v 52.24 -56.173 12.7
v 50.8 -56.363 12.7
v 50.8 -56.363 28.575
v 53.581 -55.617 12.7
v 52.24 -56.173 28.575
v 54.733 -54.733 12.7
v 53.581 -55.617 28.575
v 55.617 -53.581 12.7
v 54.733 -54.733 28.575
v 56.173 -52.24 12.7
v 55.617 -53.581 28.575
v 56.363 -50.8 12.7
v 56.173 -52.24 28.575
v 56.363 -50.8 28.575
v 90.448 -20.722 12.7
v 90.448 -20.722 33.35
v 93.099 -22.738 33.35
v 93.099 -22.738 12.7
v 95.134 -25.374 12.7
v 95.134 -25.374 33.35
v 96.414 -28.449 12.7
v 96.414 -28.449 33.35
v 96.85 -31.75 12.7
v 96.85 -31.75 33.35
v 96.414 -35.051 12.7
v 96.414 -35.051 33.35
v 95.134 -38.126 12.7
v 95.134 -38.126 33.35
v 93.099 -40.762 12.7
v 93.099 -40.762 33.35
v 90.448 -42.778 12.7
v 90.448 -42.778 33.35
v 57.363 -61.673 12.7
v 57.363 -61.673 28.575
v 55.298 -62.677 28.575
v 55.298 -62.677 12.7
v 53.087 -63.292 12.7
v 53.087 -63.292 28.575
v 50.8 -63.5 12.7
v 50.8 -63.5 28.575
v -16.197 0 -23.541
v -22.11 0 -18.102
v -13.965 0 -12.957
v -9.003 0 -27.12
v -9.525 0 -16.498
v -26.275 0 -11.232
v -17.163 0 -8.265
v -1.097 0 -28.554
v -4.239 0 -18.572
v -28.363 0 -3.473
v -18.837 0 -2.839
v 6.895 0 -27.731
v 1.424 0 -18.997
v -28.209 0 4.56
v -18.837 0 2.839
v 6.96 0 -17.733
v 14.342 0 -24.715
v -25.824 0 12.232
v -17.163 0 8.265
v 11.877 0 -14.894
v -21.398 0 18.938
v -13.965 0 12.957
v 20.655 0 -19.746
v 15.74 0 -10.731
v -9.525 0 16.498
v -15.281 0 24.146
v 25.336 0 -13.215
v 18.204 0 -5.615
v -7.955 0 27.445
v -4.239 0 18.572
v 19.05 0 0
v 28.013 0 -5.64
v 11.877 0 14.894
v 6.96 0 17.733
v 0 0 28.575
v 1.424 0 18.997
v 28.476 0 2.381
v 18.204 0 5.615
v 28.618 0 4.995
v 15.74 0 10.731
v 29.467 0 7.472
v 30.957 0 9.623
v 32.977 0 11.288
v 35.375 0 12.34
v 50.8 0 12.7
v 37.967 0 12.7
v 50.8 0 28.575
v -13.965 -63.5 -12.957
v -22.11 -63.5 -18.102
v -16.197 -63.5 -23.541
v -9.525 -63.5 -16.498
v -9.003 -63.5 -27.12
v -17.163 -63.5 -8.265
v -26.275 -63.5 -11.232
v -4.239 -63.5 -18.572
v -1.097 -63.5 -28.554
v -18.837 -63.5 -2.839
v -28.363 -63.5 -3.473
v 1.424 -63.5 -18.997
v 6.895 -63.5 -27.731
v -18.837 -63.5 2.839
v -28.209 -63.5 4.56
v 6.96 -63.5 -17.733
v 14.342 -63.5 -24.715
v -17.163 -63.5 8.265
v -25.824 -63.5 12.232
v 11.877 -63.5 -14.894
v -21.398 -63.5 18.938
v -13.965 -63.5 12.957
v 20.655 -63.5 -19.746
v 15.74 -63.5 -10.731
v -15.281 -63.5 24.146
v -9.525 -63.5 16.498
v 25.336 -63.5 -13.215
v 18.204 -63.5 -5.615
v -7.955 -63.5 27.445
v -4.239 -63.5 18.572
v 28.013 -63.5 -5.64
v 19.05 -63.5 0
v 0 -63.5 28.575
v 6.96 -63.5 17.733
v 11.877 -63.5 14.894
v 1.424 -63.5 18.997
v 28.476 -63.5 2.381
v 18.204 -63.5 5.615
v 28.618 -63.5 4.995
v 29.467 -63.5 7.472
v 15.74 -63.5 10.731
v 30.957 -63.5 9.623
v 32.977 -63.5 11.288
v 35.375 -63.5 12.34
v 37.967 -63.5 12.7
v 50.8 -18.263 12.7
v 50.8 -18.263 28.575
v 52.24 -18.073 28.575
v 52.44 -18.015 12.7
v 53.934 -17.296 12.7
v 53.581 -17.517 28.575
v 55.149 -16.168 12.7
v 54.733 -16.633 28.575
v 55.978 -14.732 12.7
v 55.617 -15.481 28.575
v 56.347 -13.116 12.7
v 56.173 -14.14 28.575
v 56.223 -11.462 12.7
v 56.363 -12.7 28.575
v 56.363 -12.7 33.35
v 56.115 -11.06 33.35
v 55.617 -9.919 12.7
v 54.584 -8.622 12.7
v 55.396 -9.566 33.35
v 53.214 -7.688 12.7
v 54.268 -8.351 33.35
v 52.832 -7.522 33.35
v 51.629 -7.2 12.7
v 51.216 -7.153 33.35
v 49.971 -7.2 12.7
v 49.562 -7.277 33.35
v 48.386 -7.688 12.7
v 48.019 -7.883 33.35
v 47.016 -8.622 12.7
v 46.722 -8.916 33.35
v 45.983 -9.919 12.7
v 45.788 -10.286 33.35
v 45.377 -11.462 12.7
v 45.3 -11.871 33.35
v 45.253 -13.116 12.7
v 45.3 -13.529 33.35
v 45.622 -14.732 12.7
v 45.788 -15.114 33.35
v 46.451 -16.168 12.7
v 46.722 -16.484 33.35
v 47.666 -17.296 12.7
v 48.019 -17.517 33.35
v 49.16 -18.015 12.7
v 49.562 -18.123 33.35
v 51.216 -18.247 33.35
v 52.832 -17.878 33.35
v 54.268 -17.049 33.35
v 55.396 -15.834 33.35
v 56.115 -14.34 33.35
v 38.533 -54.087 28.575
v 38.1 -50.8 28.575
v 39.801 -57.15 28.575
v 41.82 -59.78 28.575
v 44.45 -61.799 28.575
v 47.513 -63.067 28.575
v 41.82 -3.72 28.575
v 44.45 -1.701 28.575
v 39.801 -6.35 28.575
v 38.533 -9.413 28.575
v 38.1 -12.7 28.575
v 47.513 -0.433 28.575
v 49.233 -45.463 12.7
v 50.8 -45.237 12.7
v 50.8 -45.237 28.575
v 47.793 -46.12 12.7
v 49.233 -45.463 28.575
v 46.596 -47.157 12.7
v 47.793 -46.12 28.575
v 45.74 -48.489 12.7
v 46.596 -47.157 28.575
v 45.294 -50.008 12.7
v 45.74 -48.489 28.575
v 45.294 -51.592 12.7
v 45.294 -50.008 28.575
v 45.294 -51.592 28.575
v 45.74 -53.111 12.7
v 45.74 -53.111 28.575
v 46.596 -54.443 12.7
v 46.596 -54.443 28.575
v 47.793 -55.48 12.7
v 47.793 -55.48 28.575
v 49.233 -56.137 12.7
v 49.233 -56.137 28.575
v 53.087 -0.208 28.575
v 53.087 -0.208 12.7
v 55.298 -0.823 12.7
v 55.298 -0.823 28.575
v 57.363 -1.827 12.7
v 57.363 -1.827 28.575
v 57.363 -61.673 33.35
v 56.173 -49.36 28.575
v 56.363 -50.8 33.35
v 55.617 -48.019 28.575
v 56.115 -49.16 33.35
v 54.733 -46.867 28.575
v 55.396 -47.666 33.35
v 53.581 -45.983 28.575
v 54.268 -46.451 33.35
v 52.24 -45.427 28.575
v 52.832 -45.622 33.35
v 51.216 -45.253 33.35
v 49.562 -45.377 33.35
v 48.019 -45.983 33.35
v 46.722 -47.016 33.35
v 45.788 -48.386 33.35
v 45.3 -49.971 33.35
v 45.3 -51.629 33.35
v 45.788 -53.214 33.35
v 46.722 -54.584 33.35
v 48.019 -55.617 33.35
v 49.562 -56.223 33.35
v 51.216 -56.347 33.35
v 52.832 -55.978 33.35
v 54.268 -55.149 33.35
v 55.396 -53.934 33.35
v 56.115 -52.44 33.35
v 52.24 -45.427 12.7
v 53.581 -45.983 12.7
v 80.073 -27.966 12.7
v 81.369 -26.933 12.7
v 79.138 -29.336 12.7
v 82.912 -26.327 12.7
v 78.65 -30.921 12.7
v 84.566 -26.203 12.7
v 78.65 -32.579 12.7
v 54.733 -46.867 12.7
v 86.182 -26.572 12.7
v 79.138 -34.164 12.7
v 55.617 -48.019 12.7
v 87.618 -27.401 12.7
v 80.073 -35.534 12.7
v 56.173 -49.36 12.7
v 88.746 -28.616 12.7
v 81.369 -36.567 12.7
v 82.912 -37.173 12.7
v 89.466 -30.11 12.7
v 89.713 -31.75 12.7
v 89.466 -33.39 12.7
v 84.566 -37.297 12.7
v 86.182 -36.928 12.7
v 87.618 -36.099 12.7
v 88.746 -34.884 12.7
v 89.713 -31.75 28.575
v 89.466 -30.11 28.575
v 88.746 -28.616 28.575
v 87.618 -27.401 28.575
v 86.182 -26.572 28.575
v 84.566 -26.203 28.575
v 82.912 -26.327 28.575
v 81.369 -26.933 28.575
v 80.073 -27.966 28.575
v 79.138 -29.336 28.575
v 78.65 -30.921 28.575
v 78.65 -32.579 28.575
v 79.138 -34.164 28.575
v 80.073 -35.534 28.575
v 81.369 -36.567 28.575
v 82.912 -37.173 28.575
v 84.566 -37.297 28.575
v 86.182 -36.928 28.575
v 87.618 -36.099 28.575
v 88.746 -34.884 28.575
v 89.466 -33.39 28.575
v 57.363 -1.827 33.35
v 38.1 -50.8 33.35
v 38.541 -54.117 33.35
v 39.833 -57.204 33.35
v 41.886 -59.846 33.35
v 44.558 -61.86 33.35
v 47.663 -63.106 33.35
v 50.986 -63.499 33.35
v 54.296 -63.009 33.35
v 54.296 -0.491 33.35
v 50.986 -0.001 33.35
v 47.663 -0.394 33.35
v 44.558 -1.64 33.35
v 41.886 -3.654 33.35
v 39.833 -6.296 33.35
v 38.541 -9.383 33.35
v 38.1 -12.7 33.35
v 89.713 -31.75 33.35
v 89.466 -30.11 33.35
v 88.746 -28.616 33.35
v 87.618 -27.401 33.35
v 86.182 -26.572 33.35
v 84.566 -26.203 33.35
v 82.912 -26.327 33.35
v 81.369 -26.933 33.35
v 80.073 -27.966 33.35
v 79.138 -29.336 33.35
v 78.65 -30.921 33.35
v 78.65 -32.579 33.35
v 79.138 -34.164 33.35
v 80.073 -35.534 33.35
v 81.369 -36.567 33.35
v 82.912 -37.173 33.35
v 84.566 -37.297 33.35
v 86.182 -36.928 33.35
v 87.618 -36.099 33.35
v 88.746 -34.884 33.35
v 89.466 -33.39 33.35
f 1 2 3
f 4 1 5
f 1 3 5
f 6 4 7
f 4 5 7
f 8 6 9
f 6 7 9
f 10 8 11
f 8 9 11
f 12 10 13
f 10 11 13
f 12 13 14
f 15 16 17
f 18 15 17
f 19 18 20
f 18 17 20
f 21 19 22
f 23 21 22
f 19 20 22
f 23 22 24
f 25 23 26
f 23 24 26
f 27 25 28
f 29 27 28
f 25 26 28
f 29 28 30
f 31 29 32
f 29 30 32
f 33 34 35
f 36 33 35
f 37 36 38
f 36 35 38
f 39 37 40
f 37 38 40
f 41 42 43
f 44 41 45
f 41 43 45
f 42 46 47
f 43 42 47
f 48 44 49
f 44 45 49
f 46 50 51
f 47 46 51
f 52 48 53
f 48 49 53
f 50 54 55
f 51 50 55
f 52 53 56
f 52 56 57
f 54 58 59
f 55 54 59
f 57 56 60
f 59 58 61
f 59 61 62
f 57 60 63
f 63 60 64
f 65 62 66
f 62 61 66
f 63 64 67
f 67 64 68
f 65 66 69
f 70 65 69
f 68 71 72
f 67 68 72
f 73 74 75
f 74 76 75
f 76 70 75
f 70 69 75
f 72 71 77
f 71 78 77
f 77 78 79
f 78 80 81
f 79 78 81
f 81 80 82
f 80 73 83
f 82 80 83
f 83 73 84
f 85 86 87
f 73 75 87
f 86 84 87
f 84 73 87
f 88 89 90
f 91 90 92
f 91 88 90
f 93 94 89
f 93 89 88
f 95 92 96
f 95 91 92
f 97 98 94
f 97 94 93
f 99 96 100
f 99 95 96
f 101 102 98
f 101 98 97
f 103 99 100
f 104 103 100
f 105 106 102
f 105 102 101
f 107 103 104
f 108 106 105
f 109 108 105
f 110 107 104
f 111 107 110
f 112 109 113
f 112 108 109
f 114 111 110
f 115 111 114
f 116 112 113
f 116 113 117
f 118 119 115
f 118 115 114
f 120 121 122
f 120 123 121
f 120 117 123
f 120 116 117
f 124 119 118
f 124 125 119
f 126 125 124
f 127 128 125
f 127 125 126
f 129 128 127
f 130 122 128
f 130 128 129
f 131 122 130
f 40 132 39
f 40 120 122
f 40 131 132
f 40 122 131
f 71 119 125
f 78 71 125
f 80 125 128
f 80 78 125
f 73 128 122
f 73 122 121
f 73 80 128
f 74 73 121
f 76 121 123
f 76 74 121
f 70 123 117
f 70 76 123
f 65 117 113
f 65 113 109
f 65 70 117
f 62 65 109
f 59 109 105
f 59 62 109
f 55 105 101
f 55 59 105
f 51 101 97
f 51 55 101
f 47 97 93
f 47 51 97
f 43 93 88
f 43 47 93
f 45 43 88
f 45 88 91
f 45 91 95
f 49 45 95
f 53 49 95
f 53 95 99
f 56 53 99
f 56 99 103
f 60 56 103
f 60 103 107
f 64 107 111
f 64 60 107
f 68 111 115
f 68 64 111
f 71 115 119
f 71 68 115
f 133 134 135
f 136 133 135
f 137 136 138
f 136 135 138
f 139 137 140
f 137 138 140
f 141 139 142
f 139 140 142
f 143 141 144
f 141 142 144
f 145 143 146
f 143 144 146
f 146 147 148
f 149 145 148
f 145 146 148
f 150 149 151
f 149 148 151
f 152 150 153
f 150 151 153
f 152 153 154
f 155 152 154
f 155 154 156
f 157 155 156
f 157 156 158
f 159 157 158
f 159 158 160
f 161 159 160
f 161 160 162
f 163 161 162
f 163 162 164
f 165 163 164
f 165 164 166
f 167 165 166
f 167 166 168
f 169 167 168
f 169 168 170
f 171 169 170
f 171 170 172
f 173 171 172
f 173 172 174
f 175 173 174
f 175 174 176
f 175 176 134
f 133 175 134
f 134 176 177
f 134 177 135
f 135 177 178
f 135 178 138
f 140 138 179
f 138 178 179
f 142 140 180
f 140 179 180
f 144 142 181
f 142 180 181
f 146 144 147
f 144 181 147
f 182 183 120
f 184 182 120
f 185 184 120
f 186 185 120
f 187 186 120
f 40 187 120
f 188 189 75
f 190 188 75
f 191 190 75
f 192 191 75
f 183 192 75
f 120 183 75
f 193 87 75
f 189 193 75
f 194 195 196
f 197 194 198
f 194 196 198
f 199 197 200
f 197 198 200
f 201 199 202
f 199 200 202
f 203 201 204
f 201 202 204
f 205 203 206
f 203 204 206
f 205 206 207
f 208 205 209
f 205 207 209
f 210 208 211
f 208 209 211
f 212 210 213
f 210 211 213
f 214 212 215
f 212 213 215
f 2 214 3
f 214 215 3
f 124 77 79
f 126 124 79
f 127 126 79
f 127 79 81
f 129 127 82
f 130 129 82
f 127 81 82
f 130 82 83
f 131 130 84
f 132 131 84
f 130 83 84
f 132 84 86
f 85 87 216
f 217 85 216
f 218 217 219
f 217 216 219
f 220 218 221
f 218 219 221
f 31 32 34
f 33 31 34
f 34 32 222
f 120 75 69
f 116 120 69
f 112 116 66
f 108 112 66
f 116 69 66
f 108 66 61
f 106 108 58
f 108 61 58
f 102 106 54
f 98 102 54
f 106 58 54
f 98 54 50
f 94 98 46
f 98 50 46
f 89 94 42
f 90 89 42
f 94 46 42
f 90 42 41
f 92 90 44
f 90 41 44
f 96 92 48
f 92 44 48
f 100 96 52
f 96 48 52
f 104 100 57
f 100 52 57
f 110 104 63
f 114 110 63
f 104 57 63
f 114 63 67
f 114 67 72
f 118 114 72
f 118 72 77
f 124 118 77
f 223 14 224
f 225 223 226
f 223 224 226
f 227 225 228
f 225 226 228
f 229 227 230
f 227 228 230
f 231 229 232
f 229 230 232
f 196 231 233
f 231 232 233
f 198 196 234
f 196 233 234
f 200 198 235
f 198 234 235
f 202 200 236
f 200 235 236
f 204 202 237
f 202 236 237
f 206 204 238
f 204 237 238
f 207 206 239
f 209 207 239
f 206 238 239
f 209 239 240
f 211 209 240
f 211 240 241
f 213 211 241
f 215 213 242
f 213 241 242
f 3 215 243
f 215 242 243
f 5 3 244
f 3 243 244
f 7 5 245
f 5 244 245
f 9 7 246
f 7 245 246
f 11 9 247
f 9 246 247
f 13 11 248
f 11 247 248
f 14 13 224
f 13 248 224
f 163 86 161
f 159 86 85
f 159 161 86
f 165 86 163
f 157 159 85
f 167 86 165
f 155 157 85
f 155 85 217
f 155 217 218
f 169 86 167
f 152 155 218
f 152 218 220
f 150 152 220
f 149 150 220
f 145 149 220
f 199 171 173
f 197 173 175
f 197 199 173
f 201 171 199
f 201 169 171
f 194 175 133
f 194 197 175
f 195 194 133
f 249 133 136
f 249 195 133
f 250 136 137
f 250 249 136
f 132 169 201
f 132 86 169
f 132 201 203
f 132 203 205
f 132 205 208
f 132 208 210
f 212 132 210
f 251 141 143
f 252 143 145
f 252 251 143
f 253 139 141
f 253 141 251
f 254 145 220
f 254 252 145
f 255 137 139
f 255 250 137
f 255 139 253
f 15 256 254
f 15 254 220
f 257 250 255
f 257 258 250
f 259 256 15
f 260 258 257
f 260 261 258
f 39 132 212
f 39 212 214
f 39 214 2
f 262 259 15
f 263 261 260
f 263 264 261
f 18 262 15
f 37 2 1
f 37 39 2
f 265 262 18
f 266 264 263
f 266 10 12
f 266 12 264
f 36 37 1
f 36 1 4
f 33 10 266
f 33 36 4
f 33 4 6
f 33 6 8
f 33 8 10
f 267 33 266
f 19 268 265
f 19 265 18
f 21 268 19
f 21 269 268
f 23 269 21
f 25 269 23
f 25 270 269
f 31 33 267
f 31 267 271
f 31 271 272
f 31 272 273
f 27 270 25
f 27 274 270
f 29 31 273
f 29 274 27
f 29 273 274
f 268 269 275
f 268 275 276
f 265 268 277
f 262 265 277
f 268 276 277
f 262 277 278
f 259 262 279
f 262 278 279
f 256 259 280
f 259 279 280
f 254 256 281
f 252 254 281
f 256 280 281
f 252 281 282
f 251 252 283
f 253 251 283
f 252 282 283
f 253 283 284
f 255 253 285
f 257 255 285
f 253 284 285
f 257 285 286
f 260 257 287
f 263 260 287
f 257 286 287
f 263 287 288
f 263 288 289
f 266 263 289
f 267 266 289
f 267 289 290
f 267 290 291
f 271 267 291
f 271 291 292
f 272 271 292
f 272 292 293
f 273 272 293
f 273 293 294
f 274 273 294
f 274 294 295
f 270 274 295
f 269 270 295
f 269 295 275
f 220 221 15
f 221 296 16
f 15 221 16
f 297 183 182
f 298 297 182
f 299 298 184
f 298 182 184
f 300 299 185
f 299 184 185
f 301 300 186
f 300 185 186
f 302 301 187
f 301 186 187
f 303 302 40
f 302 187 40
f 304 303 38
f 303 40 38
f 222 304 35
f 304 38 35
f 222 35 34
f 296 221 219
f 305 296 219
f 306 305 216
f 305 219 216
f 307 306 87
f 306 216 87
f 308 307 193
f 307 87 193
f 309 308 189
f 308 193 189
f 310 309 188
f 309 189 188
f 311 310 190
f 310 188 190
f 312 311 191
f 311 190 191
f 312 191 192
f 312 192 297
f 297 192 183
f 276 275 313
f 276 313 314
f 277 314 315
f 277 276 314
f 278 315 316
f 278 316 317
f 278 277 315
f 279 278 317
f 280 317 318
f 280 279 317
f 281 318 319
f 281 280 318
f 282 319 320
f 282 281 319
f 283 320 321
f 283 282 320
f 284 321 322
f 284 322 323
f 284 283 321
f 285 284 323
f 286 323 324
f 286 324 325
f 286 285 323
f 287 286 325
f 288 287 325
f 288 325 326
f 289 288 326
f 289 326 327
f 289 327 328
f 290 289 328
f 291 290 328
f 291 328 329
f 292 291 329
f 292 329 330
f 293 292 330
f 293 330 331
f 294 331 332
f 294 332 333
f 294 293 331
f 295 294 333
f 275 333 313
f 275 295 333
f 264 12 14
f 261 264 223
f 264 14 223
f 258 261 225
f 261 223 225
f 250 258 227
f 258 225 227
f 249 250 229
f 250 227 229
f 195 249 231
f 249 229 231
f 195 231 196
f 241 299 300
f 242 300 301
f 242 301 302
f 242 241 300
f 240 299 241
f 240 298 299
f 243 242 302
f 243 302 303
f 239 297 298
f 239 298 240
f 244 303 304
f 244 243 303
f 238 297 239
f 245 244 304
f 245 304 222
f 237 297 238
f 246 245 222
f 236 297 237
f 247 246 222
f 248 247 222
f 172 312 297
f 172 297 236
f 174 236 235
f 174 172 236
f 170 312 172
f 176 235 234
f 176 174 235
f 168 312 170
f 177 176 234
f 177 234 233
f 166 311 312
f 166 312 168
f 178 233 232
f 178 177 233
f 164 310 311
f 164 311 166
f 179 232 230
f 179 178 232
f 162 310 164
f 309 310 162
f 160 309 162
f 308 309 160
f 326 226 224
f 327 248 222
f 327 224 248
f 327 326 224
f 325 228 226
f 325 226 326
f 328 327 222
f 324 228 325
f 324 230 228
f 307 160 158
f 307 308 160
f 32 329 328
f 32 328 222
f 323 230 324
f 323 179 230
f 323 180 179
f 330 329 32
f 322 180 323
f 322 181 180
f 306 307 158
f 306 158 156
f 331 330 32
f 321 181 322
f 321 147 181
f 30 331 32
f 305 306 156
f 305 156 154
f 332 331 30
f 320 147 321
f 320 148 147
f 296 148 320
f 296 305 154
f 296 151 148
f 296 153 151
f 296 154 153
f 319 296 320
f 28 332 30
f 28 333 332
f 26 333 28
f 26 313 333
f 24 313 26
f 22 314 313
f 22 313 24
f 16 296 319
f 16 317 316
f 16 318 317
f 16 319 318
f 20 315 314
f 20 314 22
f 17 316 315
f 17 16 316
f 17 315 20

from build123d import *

# Parameters (mm, degrees)
F0_R     = 19.05
F1_DEPTH = 63.5
F2_R     = 5.5626
F3_DEPTH = 4.7752
F6_DEPTH = 15.875
F7_R     = 5.5626
F8_DEPTH = 57.151


with BuildPart() as f1:
    # F0 (on Front) → F1 (new body)
    with BuildSketch(Plane.XZ):
        with BuildLine():
            Line((37.967478, 12.7), (50.8, 12.7))
            Line((50.8, 12.7), (50.8, 28.575))
            Line((50.8, 28.575), (0, 28.575))
            ThreePointArc((0, 28.575), (-19.345366, -21.030631), (28.475608, 2.38125))
            ThreePointArc((28.475608, 2.38125), (30.957268, 9.623455), (37.967478, 12.7))
        make_face()
        Circle(F0_R, mode=Mode.SUBTRACT)
    extrude(amount=F1_DEPTH)

    # F2 (on face) → F3 (join)
    with BuildSketch(Plane.XY.offset(28.575)):
        with BuildLine():
            ThreePointArc((57.36329, -1.827409), (44.557556, -1.640077), (38.1, -12.7))
            Line((38.1, -12.7), (38.1, -50.8))
            ThreePointArc((38.1, -50.8), (44.557556, -61.859923), (57.36329, -61.672591))
            Line((57.36329, -61.672591), (90.448286, -42.778332))
            ThreePointArc((90.448286, -42.778332), (96.8502, -31.75), (90.448286, -20.721668))
            Line((90.448286, -20.721668), (57.36329, -1.827409))
        make_face()
        with Locations((50.8, -50.8)):
            Circle(F2_R, mode=Mode.SUBTRACT)
        with Locations((50.8, -12.7)):
            Circle(F2_R, mode=Mode.SUBTRACT)
        with Locations((84.1502, -31.75)):
            Circle(F2_R, mode=Mode.SUBTRACT)
    extrude(amount=F3_DEPTH)

    # F5 (on face) + F4 (on face) → F6 (join)
    with BuildSketch(Plane(origin=(0, 0, 28.575), x_dir=(1, 0, 0), z_dir=(0, 0, -1))):
        with BuildLine():
            Line((90.448286, 42.778332), (57.36329, 61.672591))
            ThreePointArc((57.36329, 61.672591), (54.206472, 63.034621), (50.8, 63.5))
            Line((50.8, 63.5), (50.8, 56.3626))
            ThreePointArc((50.8, 56.3626), (56.3626, 50.8), (50.8, 45.2374))
            Line((50.8, 45.2374), (50.8, 18.2626))
            ThreePointArc((50.8, 18.2626), (56.3626, 12.7), (50.8, 7.1374))
            Line((50.8, 7.1374), (50.8, 0))
            ThreePointArc((50.8, 0), (54.206472, 0.465379), (57.36329, 1.827409))
            Line((57.36329, 1.827409), (90.448286, 20.721668))
            ThreePointArc((90.448286, 20.721668), (96.8502, 31.75), (90.448286, 42.778332))
        make_face()
    with BuildSketch(Plane(origin=(0, 0, 28.575), x_dir=(1, 0, 0), z_dir=(0, 0, -1))):
        with BuildLine():
            Line((90.448286, 42.778332), (57.36329, 61.672591))
            ThreePointArc((57.36329, 61.672591), (54.206472, 63.034621), (50.8, 63.5))
            Line((50.8, 63.5), (50.8, 56.3626))
            ThreePointArc((50.8, 56.3626), (56.3626, 50.8), (50.8, 45.2374))
            Line((50.8, 45.2374), (50.8, 18.2626))
            ThreePointArc((50.8, 18.2626), (56.3626, 12.7), (50.8, 7.1374))
            Line((50.8, 7.1374), (50.8, 0))
            ThreePointArc((50.8, 0), (54.206472, 0.465379), (57.36329, 1.827409))
            Line((57.36329, 1.827409), (90.448286, 20.721668))
            ThreePointArc((90.448286, 20.721668), (96.8502, 31.75), (90.448286, 42.778332))
        make_face()
    extrude(amount=F6_DEPTH)

    # F7 (on face) → F8 (cut, through all)
    with BuildSketch(Plane.XY.offset(28.575)):
        with Locations((50.8, -50.8)):
            Circle(F7_R)
        with Locations((50.8, -12.7)):
            Circle(F7_R)
        with Locations((84.1502, -31.75)):
            Circle(F7_R)
    extrude(amount=-F8_DEPTH, mode=Mode.SUBTRACT)


solid = f1.part
